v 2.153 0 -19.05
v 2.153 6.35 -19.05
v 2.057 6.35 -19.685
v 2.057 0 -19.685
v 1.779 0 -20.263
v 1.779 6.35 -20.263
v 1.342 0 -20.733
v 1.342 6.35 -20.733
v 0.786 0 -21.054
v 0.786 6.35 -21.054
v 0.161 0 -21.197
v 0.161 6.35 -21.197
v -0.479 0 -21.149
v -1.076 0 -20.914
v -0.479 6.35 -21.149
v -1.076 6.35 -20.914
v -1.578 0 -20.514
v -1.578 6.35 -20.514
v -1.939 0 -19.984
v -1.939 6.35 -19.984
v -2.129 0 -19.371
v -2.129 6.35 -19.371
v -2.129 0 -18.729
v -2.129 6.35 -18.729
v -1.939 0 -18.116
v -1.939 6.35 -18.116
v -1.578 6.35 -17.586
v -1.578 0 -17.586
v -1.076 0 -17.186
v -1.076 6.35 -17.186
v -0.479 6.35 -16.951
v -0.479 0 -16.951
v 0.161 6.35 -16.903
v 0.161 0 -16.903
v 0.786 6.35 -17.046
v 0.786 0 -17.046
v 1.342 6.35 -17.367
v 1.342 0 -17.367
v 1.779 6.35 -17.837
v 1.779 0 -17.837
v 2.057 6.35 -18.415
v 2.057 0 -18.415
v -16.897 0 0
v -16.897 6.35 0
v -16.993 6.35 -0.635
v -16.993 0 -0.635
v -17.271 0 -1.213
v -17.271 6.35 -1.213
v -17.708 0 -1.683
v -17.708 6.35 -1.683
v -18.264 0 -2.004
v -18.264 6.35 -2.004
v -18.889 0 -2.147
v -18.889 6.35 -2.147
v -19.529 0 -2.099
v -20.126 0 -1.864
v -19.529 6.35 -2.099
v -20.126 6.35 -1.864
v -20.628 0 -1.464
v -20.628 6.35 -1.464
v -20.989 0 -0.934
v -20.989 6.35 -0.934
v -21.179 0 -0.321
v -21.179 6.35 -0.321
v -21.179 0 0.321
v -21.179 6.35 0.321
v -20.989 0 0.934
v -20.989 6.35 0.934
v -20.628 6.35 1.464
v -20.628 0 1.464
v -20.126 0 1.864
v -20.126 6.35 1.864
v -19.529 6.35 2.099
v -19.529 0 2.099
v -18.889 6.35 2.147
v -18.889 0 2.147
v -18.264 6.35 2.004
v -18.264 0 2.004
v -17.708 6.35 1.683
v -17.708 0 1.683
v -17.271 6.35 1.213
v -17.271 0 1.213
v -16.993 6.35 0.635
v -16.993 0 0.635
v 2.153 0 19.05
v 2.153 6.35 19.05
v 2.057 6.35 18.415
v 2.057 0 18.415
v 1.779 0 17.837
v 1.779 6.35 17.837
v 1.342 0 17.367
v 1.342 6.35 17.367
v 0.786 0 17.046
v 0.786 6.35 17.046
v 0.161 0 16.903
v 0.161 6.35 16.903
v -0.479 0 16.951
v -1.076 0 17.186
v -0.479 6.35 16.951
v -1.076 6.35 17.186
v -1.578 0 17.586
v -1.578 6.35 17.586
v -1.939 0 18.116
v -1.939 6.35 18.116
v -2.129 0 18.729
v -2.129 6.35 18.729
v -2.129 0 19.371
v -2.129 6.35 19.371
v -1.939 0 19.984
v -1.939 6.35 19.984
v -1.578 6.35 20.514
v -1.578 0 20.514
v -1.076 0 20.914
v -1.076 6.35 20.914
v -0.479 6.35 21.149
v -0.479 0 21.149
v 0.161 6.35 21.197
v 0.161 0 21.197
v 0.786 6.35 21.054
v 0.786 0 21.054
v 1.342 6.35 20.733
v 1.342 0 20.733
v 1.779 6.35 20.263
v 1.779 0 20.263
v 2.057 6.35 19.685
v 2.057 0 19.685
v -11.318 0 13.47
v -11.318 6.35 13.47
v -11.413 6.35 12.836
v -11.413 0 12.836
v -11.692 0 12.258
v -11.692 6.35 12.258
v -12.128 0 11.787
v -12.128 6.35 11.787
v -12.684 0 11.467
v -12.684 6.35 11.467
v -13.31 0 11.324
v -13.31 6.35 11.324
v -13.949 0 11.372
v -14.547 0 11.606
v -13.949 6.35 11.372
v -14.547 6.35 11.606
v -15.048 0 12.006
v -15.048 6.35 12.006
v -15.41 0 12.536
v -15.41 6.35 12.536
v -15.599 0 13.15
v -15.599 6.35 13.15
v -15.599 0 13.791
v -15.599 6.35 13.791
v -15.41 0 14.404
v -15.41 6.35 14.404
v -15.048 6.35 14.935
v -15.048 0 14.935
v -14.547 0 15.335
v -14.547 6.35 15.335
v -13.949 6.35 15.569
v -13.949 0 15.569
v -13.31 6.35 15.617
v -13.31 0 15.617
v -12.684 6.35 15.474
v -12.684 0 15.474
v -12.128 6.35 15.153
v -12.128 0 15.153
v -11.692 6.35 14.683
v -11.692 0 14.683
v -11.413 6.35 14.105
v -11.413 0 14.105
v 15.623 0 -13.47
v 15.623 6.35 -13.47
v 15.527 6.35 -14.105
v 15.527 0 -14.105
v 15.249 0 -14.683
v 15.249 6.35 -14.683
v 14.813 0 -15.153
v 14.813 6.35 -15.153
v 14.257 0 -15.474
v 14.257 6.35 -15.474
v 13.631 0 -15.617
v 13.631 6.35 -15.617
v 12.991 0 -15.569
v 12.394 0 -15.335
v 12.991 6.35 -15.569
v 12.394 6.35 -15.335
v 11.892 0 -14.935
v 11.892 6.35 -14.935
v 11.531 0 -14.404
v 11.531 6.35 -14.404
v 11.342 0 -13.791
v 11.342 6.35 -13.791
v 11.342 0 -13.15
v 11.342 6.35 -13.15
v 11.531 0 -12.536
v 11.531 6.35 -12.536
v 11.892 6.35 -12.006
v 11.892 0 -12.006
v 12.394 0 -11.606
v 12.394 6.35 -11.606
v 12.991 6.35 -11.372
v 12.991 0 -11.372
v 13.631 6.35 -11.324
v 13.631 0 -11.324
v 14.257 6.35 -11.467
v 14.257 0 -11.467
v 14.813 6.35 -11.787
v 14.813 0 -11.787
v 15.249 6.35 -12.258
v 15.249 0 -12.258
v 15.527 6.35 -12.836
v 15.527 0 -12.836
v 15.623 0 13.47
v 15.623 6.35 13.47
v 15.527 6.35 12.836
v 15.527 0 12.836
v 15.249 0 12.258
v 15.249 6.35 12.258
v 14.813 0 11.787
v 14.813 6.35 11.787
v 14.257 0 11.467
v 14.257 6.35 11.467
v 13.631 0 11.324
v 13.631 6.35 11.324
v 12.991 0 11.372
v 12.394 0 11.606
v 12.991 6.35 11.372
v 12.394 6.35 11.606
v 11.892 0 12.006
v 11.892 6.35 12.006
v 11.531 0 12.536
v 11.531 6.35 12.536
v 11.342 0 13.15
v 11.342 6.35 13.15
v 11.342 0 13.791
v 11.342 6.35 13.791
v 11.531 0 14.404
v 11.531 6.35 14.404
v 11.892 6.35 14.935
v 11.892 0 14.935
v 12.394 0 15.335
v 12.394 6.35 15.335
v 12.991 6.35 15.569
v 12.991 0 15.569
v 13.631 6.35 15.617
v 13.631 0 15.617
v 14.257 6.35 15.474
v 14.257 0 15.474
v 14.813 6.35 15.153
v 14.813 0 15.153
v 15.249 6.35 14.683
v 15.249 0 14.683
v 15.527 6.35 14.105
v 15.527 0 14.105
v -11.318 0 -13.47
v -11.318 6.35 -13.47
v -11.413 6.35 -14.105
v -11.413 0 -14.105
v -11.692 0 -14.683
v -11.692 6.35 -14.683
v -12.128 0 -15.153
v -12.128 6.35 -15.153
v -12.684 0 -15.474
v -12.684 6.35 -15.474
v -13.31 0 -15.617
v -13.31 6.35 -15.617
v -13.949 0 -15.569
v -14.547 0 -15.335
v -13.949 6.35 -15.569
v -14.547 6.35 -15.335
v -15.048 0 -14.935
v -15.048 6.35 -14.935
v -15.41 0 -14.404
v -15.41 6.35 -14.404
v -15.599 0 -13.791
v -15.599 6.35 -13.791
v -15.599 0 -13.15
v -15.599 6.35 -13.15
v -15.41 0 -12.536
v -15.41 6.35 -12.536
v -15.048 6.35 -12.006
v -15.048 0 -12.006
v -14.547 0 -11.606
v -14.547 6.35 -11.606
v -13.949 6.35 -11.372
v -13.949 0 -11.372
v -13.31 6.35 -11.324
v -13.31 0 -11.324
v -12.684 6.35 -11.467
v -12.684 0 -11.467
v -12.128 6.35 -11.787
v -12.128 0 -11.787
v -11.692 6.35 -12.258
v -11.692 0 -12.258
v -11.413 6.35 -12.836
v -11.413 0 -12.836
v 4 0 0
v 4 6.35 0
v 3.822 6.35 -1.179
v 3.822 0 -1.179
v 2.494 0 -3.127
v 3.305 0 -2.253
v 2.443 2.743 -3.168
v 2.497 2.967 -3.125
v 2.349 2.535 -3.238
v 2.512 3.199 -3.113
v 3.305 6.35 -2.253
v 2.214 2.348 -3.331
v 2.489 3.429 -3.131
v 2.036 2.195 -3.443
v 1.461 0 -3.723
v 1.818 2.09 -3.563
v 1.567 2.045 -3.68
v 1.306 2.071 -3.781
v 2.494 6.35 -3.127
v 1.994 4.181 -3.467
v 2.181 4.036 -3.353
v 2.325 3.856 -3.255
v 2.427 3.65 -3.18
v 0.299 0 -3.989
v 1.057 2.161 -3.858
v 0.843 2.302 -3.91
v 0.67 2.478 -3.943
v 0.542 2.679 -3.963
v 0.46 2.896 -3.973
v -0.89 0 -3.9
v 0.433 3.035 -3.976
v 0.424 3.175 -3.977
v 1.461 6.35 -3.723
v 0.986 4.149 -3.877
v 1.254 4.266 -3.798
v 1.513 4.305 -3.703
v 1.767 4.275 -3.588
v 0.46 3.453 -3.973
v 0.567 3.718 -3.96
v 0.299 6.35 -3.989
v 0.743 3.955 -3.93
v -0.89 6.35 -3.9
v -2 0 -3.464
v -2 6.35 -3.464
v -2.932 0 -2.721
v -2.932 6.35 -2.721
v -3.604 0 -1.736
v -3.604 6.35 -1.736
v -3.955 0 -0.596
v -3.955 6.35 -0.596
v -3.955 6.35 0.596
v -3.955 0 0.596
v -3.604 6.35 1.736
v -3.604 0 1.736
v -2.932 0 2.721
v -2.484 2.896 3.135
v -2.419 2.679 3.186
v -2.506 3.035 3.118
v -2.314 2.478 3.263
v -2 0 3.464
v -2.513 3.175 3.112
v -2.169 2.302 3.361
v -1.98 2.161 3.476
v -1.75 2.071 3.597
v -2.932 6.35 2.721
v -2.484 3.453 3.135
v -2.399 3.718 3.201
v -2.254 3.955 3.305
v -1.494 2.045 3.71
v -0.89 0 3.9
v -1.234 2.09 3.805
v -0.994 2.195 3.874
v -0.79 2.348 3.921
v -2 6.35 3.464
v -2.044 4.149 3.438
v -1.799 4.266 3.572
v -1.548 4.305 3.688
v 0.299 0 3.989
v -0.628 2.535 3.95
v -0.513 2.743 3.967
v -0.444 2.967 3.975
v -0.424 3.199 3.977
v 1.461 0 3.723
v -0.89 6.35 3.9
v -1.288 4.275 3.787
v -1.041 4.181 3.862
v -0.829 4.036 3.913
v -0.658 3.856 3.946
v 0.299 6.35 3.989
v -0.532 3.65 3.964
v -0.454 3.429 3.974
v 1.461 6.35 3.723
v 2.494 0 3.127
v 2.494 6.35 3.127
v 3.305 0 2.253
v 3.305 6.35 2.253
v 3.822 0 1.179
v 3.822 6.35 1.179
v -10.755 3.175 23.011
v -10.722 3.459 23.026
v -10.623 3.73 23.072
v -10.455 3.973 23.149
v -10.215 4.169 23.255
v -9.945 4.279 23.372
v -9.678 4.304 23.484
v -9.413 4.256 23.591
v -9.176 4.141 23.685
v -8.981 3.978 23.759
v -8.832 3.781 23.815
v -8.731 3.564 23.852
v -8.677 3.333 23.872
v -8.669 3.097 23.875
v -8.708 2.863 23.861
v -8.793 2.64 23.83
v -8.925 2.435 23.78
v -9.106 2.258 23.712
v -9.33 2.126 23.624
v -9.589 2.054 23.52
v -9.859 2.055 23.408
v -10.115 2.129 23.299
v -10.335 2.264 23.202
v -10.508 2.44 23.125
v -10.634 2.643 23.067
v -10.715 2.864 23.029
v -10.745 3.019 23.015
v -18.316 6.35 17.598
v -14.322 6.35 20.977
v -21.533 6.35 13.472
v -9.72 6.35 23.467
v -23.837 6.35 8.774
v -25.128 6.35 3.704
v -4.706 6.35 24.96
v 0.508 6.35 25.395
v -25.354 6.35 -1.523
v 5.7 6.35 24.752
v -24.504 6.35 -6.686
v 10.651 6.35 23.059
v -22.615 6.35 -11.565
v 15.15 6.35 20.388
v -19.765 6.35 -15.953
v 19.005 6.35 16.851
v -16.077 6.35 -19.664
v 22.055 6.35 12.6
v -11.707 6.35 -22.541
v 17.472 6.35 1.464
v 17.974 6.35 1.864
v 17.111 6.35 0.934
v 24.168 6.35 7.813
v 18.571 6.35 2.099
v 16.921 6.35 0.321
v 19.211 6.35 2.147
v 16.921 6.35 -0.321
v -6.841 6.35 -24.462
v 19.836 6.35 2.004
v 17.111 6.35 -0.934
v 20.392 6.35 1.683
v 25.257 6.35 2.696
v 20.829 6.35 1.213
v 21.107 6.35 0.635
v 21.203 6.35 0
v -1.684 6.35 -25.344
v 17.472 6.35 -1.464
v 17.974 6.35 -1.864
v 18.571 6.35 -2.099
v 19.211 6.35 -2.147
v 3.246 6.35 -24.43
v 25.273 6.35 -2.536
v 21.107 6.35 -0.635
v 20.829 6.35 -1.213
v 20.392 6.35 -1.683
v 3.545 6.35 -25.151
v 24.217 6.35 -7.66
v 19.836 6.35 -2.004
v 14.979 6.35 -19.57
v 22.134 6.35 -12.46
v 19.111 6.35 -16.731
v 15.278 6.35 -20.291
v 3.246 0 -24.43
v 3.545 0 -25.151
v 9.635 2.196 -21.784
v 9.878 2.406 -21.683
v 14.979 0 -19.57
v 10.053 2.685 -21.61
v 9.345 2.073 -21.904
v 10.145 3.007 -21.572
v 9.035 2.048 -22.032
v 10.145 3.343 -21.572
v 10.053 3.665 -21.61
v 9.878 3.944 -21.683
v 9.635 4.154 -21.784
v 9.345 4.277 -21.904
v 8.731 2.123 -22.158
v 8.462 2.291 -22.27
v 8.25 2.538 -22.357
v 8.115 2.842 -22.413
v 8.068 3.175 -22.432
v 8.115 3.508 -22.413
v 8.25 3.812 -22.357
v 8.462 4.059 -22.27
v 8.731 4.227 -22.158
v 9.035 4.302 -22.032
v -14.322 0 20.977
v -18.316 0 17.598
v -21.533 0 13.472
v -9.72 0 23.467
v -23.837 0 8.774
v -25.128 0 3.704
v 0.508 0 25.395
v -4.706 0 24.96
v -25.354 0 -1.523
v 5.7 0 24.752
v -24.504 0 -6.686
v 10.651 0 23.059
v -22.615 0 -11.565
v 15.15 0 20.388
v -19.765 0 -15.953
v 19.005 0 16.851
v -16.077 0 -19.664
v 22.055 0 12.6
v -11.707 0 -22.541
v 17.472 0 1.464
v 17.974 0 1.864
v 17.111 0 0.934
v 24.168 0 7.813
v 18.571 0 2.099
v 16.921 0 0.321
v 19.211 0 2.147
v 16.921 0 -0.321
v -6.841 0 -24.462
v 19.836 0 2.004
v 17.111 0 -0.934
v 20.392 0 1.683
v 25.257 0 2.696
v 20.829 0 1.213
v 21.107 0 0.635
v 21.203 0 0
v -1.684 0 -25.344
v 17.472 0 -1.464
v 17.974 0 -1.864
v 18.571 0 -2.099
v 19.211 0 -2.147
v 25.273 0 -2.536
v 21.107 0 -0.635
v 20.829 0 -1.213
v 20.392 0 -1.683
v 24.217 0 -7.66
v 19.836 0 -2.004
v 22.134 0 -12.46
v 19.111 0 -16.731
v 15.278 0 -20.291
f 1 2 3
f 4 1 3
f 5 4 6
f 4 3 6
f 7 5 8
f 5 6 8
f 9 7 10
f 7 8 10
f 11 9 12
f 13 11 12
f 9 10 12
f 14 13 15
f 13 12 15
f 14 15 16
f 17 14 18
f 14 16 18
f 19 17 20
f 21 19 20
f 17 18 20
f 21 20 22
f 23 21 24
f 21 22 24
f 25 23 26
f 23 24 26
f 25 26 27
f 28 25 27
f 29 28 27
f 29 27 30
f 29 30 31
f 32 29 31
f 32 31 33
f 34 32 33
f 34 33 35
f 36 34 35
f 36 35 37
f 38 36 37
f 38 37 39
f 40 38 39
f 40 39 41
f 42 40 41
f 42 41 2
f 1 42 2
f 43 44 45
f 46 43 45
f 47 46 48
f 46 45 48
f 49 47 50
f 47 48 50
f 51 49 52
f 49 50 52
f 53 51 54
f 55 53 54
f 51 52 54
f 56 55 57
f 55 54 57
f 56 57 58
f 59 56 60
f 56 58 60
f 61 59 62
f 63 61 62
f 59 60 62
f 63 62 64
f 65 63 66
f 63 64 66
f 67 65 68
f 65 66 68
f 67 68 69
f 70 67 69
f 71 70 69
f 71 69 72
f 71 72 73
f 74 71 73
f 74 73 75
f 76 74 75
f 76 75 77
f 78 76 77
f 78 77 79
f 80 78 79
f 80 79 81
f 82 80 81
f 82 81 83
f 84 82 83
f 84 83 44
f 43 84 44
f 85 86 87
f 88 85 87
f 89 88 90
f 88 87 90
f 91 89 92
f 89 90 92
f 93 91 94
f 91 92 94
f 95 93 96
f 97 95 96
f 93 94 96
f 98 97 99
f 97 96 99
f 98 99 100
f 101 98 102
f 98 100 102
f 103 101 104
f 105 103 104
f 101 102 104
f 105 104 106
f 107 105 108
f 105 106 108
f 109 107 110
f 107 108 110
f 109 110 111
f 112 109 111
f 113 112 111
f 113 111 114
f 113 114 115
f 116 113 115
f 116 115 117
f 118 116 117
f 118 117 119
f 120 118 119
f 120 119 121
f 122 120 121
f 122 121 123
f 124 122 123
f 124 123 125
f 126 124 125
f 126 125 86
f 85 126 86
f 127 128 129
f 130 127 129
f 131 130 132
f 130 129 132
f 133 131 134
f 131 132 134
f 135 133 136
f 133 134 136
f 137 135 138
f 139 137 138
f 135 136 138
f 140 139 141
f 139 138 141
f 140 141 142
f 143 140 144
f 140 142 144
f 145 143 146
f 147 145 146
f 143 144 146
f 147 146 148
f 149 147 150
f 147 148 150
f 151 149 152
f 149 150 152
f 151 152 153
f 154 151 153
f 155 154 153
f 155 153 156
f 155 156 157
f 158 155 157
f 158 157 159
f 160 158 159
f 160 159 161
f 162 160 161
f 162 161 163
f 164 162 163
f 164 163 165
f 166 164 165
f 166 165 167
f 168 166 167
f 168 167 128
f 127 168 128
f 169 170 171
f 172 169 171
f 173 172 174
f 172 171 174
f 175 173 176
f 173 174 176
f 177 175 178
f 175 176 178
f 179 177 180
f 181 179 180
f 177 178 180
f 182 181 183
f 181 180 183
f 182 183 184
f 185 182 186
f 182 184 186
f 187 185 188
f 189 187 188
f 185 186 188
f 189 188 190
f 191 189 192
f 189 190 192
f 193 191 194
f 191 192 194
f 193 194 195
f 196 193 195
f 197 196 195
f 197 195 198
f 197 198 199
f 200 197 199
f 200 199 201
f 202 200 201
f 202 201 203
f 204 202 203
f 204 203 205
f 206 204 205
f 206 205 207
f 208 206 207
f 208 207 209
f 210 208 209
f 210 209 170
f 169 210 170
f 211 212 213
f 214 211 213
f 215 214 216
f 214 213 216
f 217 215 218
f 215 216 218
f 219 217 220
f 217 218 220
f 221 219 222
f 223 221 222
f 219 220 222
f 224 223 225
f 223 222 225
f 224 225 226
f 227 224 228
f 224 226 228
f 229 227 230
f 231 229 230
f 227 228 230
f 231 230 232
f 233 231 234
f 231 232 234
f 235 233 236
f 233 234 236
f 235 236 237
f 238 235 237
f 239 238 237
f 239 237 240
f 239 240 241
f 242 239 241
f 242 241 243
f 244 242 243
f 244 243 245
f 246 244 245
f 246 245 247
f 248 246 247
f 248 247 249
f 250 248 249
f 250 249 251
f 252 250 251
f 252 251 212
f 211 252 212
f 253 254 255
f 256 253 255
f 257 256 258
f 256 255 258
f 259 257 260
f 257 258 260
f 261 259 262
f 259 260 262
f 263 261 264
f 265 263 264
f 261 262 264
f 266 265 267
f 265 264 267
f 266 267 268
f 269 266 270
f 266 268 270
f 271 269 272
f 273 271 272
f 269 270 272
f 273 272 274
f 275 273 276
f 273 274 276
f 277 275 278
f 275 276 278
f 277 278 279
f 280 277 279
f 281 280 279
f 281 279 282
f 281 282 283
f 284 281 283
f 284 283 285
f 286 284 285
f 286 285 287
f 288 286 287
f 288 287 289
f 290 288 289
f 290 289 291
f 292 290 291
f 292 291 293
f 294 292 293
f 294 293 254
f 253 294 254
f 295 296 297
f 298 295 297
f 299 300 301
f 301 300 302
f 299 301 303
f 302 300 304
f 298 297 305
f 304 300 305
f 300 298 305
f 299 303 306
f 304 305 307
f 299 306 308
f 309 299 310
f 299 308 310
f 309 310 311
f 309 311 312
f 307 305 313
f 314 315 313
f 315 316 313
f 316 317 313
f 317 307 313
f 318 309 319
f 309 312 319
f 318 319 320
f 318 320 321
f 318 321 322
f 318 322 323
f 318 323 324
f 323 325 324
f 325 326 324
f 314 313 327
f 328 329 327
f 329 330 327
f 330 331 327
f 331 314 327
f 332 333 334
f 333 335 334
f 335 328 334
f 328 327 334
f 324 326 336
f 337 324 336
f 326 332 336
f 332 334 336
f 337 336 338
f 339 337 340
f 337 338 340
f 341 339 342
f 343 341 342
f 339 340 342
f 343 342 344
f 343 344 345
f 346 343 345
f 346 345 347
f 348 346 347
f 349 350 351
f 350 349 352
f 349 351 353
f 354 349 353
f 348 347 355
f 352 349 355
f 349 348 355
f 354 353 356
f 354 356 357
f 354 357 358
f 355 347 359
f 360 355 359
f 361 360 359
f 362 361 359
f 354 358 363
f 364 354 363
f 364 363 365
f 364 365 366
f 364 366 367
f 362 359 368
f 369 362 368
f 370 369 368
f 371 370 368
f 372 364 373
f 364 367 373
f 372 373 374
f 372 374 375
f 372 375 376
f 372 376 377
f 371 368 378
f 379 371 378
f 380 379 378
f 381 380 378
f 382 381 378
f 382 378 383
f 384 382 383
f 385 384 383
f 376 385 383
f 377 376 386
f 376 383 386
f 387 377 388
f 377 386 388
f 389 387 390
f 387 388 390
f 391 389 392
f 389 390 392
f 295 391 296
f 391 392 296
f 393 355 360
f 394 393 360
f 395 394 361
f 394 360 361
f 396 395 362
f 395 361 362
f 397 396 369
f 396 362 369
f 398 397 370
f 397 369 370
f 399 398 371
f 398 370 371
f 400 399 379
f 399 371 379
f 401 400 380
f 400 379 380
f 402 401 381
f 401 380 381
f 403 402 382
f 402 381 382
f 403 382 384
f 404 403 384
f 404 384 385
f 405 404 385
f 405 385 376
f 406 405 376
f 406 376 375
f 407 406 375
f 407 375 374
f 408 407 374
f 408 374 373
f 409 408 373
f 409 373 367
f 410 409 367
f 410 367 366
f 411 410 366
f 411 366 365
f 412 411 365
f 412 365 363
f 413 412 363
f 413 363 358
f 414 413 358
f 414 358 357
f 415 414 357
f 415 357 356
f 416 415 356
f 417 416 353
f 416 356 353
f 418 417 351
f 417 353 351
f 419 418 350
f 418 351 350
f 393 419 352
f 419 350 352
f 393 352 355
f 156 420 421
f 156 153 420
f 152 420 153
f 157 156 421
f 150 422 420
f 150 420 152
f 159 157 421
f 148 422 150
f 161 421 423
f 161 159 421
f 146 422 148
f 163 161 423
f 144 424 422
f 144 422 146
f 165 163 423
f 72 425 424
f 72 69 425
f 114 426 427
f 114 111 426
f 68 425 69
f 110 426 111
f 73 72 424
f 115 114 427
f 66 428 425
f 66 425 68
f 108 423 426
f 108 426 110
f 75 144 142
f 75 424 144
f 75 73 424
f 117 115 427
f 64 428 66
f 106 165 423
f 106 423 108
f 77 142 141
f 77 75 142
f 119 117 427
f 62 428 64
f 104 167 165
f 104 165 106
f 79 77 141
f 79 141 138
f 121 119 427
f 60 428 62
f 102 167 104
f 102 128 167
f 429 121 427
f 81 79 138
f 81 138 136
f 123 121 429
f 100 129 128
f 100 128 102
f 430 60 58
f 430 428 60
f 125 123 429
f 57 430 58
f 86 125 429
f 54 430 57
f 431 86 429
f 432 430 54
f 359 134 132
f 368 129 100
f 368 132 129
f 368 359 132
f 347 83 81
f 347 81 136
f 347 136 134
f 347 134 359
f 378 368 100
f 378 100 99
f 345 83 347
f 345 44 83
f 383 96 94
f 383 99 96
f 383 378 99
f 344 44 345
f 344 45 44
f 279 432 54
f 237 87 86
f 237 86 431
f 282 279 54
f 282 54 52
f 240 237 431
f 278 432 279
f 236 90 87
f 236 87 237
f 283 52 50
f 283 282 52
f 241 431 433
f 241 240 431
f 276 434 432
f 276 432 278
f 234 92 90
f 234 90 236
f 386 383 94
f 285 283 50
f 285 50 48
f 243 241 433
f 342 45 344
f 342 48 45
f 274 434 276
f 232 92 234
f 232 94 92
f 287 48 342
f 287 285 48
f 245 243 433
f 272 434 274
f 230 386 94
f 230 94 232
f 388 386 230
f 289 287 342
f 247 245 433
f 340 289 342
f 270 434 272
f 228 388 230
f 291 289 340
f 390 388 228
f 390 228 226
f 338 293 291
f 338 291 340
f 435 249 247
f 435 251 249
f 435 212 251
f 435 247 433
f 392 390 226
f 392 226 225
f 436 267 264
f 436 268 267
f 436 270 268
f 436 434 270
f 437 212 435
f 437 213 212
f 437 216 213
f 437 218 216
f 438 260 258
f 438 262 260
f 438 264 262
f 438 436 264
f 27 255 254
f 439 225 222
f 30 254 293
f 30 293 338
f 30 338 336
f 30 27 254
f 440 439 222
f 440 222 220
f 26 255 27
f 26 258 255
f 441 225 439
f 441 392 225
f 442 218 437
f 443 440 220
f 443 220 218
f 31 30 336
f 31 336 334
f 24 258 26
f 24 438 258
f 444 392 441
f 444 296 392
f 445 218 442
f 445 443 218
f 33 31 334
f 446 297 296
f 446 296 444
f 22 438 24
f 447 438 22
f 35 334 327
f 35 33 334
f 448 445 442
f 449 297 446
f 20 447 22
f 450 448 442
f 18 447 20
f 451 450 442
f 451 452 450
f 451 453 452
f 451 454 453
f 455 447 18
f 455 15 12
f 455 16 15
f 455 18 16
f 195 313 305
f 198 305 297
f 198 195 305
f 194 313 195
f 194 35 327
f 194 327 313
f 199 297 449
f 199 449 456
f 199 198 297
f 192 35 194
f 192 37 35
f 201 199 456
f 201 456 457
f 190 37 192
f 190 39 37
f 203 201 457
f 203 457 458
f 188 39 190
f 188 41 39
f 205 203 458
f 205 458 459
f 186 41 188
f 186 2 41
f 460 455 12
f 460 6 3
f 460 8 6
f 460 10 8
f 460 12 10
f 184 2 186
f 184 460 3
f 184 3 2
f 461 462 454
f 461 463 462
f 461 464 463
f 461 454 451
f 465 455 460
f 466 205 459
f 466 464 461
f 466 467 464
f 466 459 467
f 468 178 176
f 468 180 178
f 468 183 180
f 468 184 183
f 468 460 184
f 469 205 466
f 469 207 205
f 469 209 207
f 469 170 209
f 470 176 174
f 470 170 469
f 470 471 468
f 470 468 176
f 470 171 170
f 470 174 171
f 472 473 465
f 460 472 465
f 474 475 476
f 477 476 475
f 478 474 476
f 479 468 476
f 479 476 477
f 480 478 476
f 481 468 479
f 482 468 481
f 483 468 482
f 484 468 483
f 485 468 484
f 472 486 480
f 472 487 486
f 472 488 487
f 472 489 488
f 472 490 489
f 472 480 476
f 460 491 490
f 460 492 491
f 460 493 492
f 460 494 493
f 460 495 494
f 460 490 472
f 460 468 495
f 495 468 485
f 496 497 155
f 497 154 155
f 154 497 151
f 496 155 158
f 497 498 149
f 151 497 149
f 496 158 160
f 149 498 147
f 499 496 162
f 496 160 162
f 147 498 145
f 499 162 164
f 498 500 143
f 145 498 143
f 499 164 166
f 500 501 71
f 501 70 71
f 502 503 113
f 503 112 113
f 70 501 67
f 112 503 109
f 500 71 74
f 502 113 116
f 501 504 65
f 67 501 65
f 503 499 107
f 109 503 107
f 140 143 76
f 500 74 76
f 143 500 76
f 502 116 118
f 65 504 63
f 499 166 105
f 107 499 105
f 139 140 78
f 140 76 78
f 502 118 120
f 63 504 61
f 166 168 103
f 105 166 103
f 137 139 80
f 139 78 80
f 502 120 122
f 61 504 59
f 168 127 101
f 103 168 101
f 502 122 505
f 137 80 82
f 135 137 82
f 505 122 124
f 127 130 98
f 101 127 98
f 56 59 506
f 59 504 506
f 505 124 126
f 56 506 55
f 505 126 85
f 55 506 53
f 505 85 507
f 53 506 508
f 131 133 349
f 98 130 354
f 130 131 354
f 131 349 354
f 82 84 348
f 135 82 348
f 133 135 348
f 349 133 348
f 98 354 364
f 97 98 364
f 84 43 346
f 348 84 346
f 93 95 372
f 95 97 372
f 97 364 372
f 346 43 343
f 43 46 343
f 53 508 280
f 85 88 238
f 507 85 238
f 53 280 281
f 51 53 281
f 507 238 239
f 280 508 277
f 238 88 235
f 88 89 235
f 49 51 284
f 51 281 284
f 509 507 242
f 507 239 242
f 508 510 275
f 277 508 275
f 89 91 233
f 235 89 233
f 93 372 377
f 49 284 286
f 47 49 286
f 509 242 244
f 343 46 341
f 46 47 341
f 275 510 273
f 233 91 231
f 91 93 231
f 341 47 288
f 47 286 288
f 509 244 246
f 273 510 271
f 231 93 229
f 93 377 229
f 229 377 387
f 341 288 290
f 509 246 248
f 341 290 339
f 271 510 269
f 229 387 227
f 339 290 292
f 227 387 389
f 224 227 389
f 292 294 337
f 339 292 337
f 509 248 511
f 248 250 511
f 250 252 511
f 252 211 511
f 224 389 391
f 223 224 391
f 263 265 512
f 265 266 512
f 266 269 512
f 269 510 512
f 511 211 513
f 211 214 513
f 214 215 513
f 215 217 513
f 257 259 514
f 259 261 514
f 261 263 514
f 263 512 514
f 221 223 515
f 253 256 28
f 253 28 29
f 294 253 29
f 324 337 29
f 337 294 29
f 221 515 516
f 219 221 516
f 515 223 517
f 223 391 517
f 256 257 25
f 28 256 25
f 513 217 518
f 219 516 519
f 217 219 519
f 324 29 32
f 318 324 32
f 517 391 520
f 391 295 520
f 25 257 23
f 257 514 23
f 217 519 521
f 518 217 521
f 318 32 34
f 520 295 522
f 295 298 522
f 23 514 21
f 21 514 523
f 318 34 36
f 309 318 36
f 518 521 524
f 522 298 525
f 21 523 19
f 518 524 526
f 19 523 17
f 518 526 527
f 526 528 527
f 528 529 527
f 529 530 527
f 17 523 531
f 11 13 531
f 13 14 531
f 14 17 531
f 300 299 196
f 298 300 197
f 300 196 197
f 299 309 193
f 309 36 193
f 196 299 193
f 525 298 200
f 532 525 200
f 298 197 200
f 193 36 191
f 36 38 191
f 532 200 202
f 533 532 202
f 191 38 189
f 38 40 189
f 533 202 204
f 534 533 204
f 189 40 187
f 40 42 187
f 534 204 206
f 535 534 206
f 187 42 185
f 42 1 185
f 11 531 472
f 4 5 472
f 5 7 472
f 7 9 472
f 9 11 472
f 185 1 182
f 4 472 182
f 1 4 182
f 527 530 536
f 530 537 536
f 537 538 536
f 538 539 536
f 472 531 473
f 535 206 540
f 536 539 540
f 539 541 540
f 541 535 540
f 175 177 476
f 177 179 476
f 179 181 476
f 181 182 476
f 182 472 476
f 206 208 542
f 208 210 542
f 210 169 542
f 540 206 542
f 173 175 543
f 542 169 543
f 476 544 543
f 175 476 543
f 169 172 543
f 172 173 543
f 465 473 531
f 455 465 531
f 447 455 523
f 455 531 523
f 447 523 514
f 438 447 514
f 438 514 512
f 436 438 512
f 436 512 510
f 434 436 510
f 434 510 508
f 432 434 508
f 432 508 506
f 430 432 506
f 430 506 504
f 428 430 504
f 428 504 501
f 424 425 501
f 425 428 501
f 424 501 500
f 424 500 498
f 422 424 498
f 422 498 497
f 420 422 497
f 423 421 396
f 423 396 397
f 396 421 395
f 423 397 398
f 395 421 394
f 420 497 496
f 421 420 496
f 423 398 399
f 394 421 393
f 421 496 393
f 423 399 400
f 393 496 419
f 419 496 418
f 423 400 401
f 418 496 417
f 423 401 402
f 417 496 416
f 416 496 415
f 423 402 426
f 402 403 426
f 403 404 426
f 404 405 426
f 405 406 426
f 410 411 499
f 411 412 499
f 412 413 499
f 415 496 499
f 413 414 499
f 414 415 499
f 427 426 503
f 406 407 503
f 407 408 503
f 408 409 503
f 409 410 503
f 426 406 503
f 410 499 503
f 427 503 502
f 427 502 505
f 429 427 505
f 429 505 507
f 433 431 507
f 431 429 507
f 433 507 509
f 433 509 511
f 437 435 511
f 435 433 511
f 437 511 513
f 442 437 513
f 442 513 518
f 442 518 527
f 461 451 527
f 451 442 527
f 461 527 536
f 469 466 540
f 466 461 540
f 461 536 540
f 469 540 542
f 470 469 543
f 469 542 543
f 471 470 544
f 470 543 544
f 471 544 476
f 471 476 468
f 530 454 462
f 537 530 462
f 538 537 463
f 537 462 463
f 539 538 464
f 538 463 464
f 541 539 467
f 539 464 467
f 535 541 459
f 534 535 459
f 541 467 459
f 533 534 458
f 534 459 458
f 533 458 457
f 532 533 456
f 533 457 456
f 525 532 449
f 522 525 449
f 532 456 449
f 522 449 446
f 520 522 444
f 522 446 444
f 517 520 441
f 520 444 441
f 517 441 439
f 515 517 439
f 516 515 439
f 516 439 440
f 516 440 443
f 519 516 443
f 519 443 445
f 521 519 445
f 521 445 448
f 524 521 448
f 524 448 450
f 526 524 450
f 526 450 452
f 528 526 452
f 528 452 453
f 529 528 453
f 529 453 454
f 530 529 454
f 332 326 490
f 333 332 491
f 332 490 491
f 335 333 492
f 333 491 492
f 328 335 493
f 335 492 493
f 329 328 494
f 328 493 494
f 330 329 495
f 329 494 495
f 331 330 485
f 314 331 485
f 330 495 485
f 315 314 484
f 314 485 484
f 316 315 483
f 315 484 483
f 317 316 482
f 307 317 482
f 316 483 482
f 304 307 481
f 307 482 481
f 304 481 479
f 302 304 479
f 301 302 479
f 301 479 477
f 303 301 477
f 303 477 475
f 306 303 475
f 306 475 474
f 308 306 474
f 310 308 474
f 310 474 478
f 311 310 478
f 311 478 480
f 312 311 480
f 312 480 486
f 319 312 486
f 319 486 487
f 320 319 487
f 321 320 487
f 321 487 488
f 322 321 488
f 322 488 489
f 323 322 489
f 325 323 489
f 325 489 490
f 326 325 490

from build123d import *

# Parameters (mm, degrees)
SKETCH1_R              = 25.4
BOSS_EXTRUDE1_DEPTH    = 6.35
CUT_EXTRUDE2_REACH     = 8.35
SKETCH3_R              = 2.15265
SKETCH5_W              = 12.7
SKETCH5_H              = 6.35
CUT_EXTRUDE3_DEPTH     = 1.5875
F_4_40TAPPEDHOLE_REACH = 58.999
SKETCH6_R              = 1.1303
CUT_EXTRUDE5_REACH     = 8.35
SKETCH8_R              = 4


with BuildPart() as part:
    # Sketch1 → Boss-Extrude1 (new body)
    with BuildSketch(Plane(origin=(0, 0, 0), x_dir=(1, 0, 0), z_dir=(0, 1, 0))):
        Circle(SKETCH1_R)
    extrude(amount=BOSS_EXTRUDE1_DEPTH)

    # Sketch3 → Cut-Extrude2 (cut, up to next)
    with BuildSketch(Plane(origin=(0, 6.35, 0), x_dir=(1, 0, 0), z_dir=(0, 1, 0)), mode=Mode.PRIVATE) as cut_extrude2_sk1:
        with Locations((-13.470384182, 13.470384182)):
            Circle(SKETCH3_R)
    cut_extrude2_tool1 = extrude(cut_extrude2_sk1.sketch, amount=-CUT_EXTRUDE2_REACH, mode=Mode.PRIVATE) & part.part
    add(cut_extrude2_tool1.solids().sort_by_distance((-13.470384, 6.35, -13.470384))[0], mode=Mode.SUBTRACT)
    # Sketch3 → Cut-Extrude2 (cut, up to next)
    with BuildSketch(Plane(origin=(0, 6.35, 0), x_dir=(1, 0, 0), z_dir=(0, 1, 0)), mode=Mode.PRIVATE) as cut_extrude2_sk2:
        with Locations((0, 19.05)):
            Circle(SKETCH3_R)
    cut_extrude2_tool2 = extrude(cut_extrude2_sk2.sketch, amount=-CUT_EXTRUDE2_REACH, mode=Mode.PRIVATE) & part.part
    add(cut_extrude2_tool2.solids().sort_by_distance((0, 6.35, -19.05))[0], mode=Mode.SUBTRACT)
    # Sketch3 → Cut-Extrude2 (cut, up to next)
    with BuildSketch(Plane(origin=(0, 6.35, 0), x_dir=(1, 0, 0), z_dir=(0, 1, 0)), mode=Mode.PRIVATE) as cut_extrude2_sk3:
        with Locations((13.470384182, 13.470384182)):
            Circle(SKETCH3_R)
    cut_extrude2_tool3 = extrude(cut_extrude2_sk3.sketch, amount=-CUT_EXTRUDE2_REACH, mode=Mode.PRIVATE) & part.part
    add(cut_extrude2_tool3.solids().sort_by_distance((13.470384, 6.35, -13.470384))[0], mode=Mode.SUBTRACT)
    # Sketch3 → Cut-Extrude2 (cut, up to next)
    with BuildSketch(Plane(origin=(0, 6.35, 0), x_dir=(1, 0, 0), z_dir=(0, 1, 0)), mode=Mode.PRIVATE) as cut_extrude2_sk4:
        with Locations((19.05, 0)):
            Circle(SKETCH3_R)
    cut_extrude2_tool4 = extrude(cut_extrude2_sk4.sketch, amount=-CUT_EXTRUDE2_REACH, mode=Mode.PRIVATE) & part.part
    add(cut_extrude2_tool4.solids().sort_by_distance((19.05, 6.35, 0))[0], mode=Mode.SUBTRACT)
    # Sketch3 → Cut-Extrude2 (cut, up to next)
    with BuildSketch(Plane(origin=(0, 6.35, 0), x_dir=(1, 0, 0), z_dir=(0, 1, 0)), mode=Mode.PRIVATE) as cut_extrude2_sk5:
        with Locations((13.470384182, -13.470384182)):
            Circle(SKETCH3_R)
    cut_extrude2_tool5 = extrude(cut_extrude2_sk5.sketch, amount=-CUT_EXTRUDE2_REACH, mode=Mode.PRIVATE) & part.part
    add(cut_extrude2_tool5.solids().sort_by_distance((13.470384, 6.35, 13.470384))[0], mode=Mode.SUBTRACT)
    # Sketch3 → Cut-Extrude2 (cut, up to next)
    with BuildSketch(Plane(origin=(0, 6.35, 0), x_dir=(1, 0, 0), z_dir=(0, 1, 0)), mode=Mode.PRIVATE) as cut_extrude2_sk6:
        with Locations((0, -19.05)):
            Circle(SKETCH3_R)
    cut_extrude2_tool6 = extrude(cut_extrude2_sk6.sketch, amount=-CUT_EXTRUDE2_REACH, mode=Mode.PRIVATE) & part.part
    add(cut_extrude2_tool6.solids().sort_by_distance((0, 6.35, 19.05))[0], mode=Mode.SUBTRACT)
    # Sketch3 → Cut-Extrude2 (cut, up to next)
    with BuildSketch(Plane(origin=(0, 6.35, 0), x_dir=(1, 0, 0), z_dir=(0, 1, 0)), mode=Mode.PRIVATE) as cut_extrude2_sk7:
        with Locations((-13.470384182, -13.470384182)):
            Circle(SKETCH3_R)
    cut_extrude2_tool7 = extrude(cut_extrude2_sk7.sketch, amount=-CUT_EXTRUDE2_REACH, mode=Mode.PRIVATE) & part.part
    add(cut_extrude2_tool7.solids().sort_by_distance((-13.470384, 6.35, 13.470384))[0], mode=Mode.SUBTRACT)
    # Sketch3 → Cut-Extrude2 (cut, up to next)
    with BuildSketch(Plane(origin=(0, 6.35, 0), x_dir=(1, 0, 0), z_dir=(0, 1, 0)), mode=Mode.PRIVATE) as cut_extrude2_sk8:
        with Locations((-19.05, 0)):
            Circle(SKETCH3_R)
    cut_extrude2_tool8 = extrude(cut_extrude2_sk8.sketch, amount=-CUT_EXTRUDE2_REACH, mode=Mode.PRIVATE) & part.part
    add(cut_extrude2_tool8.solids().sort_by_distance((-19.05, 6.35, 0))[0], mode=Mode.SUBTRACT)

    # Sketch5 → Cut-Extrude3 (cut)
    with BuildSketch(Plane(origin=(9.720159182, 0, -23.466540126), x_dir=(-0.923879533, 0, -0.382683432), z_dir=(0.382683432, 0, -0.923879533))):
        with Locations((0, 3.175)):
            Rectangle(SKETCH5_W, SKETCH5_H)
    extrude(amount=-CUT_EXTRUDE3_DEPTH, mode=Mode.SUBTRACT)

    # Sketch6 → 4-40TappedHole (cut, up to next)
    with BuildSketch(Plane(origin=(9.112649233, 0, -21.999881368), x_dir=(-0.923879533, 0, -0.382683432), z_dir=(0.382683432, 0, -0.923879533)), mode=Mode.PRIVATE) as f_4_40tappedhole_sk1:
        with Locations((0, 3.175)):
            Circle(SKETCH6_R)
    f_4_40tappedhole_tool1 = extrude(f_4_40tappedhole_sk1.sketch, amount=-F_4_40TAPPEDHOLE_REACH, mode=Mode.PRIVATE) & part.part
    add(f_4_40tappedhole_tool1.solids().sort_by_distance((9.112649, 3.175, -21.999881))[0], mode=Mode.SUBTRACT)

    # Sketch8 → Cut-Extrude5 (cut, up to next)
    with BuildSketch(Plane(origin=(0, 6.35, 0), x_dir=(1, 0, 0), z_dir=(0, 1, 0)), mode=Mode.PRIVATE) as cut_extrude5_sk1:
        Circle(SKETCH8_R)
    cut_extrude5_tool1 = extrude(cut_extrude5_sk1.sketch, amount=-CUT_EXTRUDE5_REACH, mode=Mode.PRIVATE) & part.part
    add(cut_extrude5_tool1.solids().sort_by_distance((0, 6.35, 0))[0], mode=Mode.SUBTRACT)


solid = part.part
